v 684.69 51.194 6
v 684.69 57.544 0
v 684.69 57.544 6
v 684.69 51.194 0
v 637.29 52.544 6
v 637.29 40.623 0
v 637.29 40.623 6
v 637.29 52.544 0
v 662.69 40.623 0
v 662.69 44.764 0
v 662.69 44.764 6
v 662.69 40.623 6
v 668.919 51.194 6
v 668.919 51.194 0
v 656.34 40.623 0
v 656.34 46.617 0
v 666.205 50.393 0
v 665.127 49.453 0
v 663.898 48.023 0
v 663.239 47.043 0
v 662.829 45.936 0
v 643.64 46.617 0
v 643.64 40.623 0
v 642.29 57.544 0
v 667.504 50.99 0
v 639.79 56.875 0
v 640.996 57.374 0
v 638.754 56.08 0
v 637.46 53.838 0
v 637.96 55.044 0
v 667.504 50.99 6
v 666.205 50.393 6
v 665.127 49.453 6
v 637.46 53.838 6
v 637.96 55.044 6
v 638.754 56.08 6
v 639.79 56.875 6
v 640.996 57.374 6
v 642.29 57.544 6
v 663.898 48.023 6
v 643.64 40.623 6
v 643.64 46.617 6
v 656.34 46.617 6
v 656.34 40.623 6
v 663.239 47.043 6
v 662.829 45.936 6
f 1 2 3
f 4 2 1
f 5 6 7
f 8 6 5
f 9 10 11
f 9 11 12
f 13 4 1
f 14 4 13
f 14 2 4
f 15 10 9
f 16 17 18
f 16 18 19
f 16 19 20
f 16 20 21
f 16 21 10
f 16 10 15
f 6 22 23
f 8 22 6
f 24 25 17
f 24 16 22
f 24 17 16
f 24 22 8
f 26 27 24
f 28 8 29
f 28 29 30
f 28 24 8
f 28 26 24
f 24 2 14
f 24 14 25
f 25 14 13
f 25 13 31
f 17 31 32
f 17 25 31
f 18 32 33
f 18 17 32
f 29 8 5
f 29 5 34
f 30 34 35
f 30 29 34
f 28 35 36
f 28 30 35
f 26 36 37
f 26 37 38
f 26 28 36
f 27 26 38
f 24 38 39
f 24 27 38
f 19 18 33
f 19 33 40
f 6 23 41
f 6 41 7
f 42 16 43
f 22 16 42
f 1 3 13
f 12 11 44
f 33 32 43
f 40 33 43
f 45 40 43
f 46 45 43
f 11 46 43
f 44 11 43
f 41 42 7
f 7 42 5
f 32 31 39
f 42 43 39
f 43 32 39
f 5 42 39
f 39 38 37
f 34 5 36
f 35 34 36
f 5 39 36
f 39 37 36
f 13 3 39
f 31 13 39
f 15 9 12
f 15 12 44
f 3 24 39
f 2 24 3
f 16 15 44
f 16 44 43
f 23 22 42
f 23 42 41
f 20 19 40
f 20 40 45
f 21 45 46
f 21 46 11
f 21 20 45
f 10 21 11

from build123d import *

# Parameters (mm, degrees)
BOSS_EXTRUDE1_DEPTH = 6


with BuildPart() as part:
    # Sketch1 → Boss-Extrude1 (new body)
    with BuildSketch(Plane.XY):
        with BuildLine():
            Line((684.689802479, 51.1944), (668.919080645, 51.1944))
            ThreePointArc((668.919080645, 51.1944), (666.832798953, 50.738344179), (665.127101625, 49.453371481))
            Line((665.127101625, 49.453371481), (663.897823459, 48.023043832))
            ThreePointArc((663.897823459, 48.023043832), (663.001524805, 46.501902162), (662.689802479, 44.764072351))
            Line((662.689802479, 44.764072351), (662.689802479, 40.62305))
            Line((662.689802479, 40.62305), (656.339802479, 40.62305))
            Line((656.339802479, 40.62305), (656.339802479, 46.61745))
            Line((656.339802479, 46.61745), (643.639802479, 46.61745))
            Line((643.639802479, 46.61745), (643.639802479, 40.62305))
            Line((643.639802479, 40.62305), (637.289802479, 40.62305))
            Line((637.289802479, 40.62305), (637.289802479, 52.5444))
            ThreePointArc((637.289802479, 52.5444), (638.754268573, 56.079933906), (642.289802479, 57.5444))
            Line((642.289802479, 57.5444), (662.689802479, 57.5444))
            Line((662.689802479, 57.5444), (684.689802479, 57.5444))
            Line((684.689802479, 57.5444), (684.689802479, 51.1944))
        make_face()
    extrude(amount=BOSS_EXTRUDE1_DEPTH)


solid = part.part
